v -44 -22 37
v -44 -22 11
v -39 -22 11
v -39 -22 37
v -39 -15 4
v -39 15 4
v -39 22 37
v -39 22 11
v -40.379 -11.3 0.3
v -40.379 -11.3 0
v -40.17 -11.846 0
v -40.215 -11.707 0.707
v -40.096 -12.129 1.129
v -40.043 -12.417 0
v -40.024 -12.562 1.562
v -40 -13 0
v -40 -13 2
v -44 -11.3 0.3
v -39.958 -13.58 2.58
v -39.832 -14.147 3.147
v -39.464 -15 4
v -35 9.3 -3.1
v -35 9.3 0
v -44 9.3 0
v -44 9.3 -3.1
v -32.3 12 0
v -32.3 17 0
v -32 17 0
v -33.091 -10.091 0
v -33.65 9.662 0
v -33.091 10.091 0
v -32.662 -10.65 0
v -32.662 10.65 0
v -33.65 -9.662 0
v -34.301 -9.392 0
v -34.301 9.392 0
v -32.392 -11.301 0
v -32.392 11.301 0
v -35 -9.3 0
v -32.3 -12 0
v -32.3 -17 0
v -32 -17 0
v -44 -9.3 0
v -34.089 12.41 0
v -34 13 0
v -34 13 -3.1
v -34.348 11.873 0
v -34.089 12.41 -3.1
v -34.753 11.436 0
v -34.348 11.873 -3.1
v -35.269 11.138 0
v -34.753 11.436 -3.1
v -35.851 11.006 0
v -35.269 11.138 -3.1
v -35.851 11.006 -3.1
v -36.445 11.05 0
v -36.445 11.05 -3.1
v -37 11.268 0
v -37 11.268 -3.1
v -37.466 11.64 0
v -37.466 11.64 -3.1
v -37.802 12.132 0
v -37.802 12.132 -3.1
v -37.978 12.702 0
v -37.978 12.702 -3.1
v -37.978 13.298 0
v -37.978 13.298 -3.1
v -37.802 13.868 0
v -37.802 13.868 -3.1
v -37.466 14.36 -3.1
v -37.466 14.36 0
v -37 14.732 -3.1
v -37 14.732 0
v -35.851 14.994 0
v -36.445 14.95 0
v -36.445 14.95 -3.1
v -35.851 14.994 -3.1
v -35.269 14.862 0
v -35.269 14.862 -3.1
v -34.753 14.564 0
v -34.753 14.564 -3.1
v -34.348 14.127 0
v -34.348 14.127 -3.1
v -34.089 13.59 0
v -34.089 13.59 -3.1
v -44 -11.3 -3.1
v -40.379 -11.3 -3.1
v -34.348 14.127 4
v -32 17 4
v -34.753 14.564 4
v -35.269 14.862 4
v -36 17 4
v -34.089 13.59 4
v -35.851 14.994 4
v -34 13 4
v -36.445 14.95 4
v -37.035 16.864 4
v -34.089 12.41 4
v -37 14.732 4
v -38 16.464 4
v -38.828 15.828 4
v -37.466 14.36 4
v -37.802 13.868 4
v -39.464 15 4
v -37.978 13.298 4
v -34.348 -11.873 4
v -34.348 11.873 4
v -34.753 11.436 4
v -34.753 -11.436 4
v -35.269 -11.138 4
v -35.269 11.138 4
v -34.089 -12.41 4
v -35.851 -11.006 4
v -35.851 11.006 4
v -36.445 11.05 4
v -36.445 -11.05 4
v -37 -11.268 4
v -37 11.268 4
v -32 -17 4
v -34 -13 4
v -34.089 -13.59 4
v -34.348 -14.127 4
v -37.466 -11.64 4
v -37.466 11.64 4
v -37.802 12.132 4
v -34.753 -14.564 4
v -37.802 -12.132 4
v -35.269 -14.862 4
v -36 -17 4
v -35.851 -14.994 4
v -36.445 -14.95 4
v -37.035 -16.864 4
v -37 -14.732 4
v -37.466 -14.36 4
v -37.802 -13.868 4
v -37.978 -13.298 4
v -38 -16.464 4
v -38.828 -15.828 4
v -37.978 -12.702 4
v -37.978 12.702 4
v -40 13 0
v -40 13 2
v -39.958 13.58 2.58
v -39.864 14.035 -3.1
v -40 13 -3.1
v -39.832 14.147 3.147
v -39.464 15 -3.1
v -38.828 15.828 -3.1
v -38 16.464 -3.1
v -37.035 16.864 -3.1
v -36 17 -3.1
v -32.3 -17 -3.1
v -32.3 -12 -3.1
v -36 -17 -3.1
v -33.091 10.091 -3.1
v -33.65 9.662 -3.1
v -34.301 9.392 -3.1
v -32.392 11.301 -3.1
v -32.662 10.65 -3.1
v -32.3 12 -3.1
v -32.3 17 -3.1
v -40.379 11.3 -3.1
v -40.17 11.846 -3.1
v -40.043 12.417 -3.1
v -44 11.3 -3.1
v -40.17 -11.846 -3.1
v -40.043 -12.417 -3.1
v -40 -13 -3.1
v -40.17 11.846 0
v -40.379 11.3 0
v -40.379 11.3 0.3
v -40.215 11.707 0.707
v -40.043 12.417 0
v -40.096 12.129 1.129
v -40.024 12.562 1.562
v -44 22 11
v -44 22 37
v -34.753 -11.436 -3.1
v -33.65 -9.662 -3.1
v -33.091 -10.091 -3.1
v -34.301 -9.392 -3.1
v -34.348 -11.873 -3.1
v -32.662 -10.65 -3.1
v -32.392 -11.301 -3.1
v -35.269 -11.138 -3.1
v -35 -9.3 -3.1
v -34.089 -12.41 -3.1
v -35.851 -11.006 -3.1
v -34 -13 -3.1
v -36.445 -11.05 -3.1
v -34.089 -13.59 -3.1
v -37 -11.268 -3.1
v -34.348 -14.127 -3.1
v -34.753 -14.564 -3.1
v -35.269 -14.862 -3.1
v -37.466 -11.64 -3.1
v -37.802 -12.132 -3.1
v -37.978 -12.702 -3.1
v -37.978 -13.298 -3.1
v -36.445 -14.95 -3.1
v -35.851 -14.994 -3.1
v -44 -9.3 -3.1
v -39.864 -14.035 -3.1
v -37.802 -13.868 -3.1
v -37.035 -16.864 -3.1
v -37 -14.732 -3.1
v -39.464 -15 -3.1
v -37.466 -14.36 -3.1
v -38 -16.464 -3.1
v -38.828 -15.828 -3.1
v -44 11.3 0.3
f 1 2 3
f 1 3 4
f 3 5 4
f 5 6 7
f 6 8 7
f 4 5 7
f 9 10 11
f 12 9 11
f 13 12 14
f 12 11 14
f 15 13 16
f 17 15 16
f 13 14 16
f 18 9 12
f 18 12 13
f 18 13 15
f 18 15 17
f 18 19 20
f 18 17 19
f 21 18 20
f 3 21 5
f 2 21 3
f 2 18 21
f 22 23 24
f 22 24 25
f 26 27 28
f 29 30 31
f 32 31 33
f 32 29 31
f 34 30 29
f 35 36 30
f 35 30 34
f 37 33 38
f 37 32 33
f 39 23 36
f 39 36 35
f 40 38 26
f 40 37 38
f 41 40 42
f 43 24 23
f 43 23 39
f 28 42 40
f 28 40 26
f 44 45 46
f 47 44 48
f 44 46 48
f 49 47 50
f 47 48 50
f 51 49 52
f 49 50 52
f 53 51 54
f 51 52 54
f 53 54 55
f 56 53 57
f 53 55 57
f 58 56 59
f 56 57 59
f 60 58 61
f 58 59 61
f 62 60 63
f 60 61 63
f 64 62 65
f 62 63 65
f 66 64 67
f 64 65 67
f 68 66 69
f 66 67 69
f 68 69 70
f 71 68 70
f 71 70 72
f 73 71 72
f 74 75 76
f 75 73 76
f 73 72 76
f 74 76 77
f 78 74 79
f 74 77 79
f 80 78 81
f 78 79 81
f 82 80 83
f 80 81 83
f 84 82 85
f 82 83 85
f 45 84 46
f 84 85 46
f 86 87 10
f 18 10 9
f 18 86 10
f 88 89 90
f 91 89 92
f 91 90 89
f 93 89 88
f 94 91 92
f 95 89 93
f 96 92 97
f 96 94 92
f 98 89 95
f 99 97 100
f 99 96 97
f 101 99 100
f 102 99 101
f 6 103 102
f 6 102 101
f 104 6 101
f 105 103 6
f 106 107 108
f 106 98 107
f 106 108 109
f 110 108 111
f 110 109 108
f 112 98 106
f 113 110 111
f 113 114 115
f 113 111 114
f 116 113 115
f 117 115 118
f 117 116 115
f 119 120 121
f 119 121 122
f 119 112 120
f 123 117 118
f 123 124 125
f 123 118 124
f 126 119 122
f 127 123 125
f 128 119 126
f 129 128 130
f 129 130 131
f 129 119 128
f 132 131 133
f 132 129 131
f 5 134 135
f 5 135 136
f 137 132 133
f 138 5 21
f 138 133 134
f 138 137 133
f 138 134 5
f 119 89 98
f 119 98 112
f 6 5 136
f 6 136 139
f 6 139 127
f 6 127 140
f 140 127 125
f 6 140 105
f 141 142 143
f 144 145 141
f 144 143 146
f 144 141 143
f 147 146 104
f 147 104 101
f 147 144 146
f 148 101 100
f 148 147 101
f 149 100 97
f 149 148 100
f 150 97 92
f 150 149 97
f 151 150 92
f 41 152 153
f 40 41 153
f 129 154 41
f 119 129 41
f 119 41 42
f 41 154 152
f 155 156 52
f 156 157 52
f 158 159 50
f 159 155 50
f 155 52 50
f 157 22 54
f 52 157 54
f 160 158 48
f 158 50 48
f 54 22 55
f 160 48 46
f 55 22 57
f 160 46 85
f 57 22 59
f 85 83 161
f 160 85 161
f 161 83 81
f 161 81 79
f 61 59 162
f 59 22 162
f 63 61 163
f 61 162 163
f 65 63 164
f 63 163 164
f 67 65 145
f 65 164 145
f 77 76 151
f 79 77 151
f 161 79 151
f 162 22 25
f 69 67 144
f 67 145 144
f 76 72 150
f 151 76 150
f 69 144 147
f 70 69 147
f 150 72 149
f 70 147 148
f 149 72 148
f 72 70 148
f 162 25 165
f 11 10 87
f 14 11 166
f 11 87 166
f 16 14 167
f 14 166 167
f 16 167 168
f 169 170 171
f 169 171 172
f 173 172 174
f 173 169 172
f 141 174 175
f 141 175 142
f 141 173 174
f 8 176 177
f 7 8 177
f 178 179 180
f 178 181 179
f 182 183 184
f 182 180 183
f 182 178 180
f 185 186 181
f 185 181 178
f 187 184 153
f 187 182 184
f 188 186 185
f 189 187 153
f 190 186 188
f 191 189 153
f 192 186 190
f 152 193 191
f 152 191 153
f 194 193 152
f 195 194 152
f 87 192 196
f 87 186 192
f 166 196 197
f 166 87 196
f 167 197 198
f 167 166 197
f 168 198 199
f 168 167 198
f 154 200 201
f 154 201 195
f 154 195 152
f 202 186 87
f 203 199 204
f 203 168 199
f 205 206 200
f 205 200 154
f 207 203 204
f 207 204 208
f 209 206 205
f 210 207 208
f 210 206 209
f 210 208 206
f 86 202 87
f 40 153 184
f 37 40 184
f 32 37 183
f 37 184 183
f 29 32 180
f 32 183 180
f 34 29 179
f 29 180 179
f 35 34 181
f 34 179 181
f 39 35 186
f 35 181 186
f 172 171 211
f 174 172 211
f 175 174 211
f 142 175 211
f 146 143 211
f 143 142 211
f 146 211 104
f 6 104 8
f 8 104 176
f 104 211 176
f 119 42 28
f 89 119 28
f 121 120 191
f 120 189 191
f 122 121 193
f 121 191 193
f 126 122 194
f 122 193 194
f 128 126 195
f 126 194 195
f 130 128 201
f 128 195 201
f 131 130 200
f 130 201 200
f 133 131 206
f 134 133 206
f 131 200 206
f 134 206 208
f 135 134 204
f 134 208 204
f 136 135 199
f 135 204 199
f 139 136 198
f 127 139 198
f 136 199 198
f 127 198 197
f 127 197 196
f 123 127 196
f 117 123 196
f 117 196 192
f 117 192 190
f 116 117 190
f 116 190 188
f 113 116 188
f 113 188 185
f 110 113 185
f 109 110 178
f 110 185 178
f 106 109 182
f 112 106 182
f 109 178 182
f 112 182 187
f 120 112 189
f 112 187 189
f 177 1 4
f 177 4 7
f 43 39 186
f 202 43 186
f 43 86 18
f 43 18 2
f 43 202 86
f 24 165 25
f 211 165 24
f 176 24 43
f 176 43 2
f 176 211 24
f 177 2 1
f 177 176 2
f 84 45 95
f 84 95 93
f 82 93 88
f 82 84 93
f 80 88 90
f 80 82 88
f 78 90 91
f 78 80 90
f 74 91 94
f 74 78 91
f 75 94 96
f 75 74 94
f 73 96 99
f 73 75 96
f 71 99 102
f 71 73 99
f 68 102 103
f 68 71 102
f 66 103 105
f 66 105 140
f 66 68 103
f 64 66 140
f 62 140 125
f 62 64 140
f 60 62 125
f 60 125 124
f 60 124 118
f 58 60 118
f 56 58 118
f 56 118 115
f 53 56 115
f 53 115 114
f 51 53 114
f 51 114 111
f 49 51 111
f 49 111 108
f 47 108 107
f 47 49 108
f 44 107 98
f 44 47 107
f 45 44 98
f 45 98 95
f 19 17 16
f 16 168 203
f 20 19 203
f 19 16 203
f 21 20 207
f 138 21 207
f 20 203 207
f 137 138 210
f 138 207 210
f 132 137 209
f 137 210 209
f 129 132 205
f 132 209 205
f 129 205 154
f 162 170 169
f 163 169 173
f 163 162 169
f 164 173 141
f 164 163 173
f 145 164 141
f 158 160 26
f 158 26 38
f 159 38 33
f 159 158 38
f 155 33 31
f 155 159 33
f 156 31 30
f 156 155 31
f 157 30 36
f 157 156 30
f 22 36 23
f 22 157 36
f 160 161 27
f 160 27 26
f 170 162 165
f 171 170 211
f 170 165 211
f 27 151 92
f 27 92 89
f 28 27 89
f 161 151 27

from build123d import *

# Parameters (mm, degrees)
SKETCH1_R           = 2
BOSS_EXTRUDE1_DEPTH = 4
BOSS_EXTRUDE2_START = 3.1
SKETCH2_R           = 2
BOSS_EXTRUDE2_DEPTH = 3.1
BOSS_EXTRUDE3_DEPTH = 5


with BuildPart() as part:
    # Sketch1 → Boss-Extrude1 (new body)
    with BuildSketch(Plane.XY):
        with BuildLine():
            Line((-44, 0), (-44, 9))
            ThreePointArc((-44, 9), (-41.171572875, 10.171572875), (-40, 13))
            ThreePointArc((-40, 13), (-38.828427125, 15.828427125), (-36, 17))
            Line((-36, 17), (-32, 17))
            Line((-32, 17), (-32, 0))
            Line((-32, 0), (-44, 0))
        make_face()
        with Locations((-36, 13)):
            Circle(SKETCH1_R, mode=Mode.SUBTRACT)
    extrude(amount=BOSS_EXTRUDE1_DEPTH)

    # Sketch2 → Boss-Extrude2 (add)
    with BuildSketch(Plane(origin=(0, 0, 0), x_dir=(-1, 0, 0), z_dir=(0, 0, -1)).offset(BOSS_EXTRUDE2_START)):
        with BuildLine():
            Line((35, 9.3), (42.480131585, 9.3))
            ThreePointArc((42.480131585, 9.3), (40.677390057, 10.772835172), (40, 13))
            ThreePointArc((40, 13), (38.828427125, 15.828427125), (36, 17))
            Line((36, 17), (32.3, 17))
            Line((32.3, 17), (32.3, 12))
            ThreePointArc((32.3, 12), (33.090811691, 10.090811691), (35, 9.3))
        make_face()
        with Locations(Location((36, 13, 0), (0, 0, 180))):
            Circle(SKETCH2_R, mode=Mode.SUBTRACT)
    extrude(amount=-BOSS_EXTRUDE2_DEPTH)

    # Sketch4 → Boss-Extrude3 (add)
    with BuildSketch(Plane(origin=(-44, -0.024459729, 0), x_dir=(0, 0, 1), z_dir=(1, 0, 0))):
        Polygon((0.3, -11.324459729), (11, -22.024459729), (37, -22.024459729), (37, -0.024459729), (0, -0.024459729), (0, -9.324459729), (-3.1, -9.324459729), (-3.1, -11.324459729), align=None)
    extrude(amount=BOSS_EXTRUDE3_DEPTH)

    # Mirror1: part across plane


with BuildPart() as part_1:
    add(part.part)
    add(part.part.mirror(Plane(origin=(-44, 0, 4), x_dir=(0, 0, 1), z_dir=(0, 1, 0))))


solid = part_1.part
